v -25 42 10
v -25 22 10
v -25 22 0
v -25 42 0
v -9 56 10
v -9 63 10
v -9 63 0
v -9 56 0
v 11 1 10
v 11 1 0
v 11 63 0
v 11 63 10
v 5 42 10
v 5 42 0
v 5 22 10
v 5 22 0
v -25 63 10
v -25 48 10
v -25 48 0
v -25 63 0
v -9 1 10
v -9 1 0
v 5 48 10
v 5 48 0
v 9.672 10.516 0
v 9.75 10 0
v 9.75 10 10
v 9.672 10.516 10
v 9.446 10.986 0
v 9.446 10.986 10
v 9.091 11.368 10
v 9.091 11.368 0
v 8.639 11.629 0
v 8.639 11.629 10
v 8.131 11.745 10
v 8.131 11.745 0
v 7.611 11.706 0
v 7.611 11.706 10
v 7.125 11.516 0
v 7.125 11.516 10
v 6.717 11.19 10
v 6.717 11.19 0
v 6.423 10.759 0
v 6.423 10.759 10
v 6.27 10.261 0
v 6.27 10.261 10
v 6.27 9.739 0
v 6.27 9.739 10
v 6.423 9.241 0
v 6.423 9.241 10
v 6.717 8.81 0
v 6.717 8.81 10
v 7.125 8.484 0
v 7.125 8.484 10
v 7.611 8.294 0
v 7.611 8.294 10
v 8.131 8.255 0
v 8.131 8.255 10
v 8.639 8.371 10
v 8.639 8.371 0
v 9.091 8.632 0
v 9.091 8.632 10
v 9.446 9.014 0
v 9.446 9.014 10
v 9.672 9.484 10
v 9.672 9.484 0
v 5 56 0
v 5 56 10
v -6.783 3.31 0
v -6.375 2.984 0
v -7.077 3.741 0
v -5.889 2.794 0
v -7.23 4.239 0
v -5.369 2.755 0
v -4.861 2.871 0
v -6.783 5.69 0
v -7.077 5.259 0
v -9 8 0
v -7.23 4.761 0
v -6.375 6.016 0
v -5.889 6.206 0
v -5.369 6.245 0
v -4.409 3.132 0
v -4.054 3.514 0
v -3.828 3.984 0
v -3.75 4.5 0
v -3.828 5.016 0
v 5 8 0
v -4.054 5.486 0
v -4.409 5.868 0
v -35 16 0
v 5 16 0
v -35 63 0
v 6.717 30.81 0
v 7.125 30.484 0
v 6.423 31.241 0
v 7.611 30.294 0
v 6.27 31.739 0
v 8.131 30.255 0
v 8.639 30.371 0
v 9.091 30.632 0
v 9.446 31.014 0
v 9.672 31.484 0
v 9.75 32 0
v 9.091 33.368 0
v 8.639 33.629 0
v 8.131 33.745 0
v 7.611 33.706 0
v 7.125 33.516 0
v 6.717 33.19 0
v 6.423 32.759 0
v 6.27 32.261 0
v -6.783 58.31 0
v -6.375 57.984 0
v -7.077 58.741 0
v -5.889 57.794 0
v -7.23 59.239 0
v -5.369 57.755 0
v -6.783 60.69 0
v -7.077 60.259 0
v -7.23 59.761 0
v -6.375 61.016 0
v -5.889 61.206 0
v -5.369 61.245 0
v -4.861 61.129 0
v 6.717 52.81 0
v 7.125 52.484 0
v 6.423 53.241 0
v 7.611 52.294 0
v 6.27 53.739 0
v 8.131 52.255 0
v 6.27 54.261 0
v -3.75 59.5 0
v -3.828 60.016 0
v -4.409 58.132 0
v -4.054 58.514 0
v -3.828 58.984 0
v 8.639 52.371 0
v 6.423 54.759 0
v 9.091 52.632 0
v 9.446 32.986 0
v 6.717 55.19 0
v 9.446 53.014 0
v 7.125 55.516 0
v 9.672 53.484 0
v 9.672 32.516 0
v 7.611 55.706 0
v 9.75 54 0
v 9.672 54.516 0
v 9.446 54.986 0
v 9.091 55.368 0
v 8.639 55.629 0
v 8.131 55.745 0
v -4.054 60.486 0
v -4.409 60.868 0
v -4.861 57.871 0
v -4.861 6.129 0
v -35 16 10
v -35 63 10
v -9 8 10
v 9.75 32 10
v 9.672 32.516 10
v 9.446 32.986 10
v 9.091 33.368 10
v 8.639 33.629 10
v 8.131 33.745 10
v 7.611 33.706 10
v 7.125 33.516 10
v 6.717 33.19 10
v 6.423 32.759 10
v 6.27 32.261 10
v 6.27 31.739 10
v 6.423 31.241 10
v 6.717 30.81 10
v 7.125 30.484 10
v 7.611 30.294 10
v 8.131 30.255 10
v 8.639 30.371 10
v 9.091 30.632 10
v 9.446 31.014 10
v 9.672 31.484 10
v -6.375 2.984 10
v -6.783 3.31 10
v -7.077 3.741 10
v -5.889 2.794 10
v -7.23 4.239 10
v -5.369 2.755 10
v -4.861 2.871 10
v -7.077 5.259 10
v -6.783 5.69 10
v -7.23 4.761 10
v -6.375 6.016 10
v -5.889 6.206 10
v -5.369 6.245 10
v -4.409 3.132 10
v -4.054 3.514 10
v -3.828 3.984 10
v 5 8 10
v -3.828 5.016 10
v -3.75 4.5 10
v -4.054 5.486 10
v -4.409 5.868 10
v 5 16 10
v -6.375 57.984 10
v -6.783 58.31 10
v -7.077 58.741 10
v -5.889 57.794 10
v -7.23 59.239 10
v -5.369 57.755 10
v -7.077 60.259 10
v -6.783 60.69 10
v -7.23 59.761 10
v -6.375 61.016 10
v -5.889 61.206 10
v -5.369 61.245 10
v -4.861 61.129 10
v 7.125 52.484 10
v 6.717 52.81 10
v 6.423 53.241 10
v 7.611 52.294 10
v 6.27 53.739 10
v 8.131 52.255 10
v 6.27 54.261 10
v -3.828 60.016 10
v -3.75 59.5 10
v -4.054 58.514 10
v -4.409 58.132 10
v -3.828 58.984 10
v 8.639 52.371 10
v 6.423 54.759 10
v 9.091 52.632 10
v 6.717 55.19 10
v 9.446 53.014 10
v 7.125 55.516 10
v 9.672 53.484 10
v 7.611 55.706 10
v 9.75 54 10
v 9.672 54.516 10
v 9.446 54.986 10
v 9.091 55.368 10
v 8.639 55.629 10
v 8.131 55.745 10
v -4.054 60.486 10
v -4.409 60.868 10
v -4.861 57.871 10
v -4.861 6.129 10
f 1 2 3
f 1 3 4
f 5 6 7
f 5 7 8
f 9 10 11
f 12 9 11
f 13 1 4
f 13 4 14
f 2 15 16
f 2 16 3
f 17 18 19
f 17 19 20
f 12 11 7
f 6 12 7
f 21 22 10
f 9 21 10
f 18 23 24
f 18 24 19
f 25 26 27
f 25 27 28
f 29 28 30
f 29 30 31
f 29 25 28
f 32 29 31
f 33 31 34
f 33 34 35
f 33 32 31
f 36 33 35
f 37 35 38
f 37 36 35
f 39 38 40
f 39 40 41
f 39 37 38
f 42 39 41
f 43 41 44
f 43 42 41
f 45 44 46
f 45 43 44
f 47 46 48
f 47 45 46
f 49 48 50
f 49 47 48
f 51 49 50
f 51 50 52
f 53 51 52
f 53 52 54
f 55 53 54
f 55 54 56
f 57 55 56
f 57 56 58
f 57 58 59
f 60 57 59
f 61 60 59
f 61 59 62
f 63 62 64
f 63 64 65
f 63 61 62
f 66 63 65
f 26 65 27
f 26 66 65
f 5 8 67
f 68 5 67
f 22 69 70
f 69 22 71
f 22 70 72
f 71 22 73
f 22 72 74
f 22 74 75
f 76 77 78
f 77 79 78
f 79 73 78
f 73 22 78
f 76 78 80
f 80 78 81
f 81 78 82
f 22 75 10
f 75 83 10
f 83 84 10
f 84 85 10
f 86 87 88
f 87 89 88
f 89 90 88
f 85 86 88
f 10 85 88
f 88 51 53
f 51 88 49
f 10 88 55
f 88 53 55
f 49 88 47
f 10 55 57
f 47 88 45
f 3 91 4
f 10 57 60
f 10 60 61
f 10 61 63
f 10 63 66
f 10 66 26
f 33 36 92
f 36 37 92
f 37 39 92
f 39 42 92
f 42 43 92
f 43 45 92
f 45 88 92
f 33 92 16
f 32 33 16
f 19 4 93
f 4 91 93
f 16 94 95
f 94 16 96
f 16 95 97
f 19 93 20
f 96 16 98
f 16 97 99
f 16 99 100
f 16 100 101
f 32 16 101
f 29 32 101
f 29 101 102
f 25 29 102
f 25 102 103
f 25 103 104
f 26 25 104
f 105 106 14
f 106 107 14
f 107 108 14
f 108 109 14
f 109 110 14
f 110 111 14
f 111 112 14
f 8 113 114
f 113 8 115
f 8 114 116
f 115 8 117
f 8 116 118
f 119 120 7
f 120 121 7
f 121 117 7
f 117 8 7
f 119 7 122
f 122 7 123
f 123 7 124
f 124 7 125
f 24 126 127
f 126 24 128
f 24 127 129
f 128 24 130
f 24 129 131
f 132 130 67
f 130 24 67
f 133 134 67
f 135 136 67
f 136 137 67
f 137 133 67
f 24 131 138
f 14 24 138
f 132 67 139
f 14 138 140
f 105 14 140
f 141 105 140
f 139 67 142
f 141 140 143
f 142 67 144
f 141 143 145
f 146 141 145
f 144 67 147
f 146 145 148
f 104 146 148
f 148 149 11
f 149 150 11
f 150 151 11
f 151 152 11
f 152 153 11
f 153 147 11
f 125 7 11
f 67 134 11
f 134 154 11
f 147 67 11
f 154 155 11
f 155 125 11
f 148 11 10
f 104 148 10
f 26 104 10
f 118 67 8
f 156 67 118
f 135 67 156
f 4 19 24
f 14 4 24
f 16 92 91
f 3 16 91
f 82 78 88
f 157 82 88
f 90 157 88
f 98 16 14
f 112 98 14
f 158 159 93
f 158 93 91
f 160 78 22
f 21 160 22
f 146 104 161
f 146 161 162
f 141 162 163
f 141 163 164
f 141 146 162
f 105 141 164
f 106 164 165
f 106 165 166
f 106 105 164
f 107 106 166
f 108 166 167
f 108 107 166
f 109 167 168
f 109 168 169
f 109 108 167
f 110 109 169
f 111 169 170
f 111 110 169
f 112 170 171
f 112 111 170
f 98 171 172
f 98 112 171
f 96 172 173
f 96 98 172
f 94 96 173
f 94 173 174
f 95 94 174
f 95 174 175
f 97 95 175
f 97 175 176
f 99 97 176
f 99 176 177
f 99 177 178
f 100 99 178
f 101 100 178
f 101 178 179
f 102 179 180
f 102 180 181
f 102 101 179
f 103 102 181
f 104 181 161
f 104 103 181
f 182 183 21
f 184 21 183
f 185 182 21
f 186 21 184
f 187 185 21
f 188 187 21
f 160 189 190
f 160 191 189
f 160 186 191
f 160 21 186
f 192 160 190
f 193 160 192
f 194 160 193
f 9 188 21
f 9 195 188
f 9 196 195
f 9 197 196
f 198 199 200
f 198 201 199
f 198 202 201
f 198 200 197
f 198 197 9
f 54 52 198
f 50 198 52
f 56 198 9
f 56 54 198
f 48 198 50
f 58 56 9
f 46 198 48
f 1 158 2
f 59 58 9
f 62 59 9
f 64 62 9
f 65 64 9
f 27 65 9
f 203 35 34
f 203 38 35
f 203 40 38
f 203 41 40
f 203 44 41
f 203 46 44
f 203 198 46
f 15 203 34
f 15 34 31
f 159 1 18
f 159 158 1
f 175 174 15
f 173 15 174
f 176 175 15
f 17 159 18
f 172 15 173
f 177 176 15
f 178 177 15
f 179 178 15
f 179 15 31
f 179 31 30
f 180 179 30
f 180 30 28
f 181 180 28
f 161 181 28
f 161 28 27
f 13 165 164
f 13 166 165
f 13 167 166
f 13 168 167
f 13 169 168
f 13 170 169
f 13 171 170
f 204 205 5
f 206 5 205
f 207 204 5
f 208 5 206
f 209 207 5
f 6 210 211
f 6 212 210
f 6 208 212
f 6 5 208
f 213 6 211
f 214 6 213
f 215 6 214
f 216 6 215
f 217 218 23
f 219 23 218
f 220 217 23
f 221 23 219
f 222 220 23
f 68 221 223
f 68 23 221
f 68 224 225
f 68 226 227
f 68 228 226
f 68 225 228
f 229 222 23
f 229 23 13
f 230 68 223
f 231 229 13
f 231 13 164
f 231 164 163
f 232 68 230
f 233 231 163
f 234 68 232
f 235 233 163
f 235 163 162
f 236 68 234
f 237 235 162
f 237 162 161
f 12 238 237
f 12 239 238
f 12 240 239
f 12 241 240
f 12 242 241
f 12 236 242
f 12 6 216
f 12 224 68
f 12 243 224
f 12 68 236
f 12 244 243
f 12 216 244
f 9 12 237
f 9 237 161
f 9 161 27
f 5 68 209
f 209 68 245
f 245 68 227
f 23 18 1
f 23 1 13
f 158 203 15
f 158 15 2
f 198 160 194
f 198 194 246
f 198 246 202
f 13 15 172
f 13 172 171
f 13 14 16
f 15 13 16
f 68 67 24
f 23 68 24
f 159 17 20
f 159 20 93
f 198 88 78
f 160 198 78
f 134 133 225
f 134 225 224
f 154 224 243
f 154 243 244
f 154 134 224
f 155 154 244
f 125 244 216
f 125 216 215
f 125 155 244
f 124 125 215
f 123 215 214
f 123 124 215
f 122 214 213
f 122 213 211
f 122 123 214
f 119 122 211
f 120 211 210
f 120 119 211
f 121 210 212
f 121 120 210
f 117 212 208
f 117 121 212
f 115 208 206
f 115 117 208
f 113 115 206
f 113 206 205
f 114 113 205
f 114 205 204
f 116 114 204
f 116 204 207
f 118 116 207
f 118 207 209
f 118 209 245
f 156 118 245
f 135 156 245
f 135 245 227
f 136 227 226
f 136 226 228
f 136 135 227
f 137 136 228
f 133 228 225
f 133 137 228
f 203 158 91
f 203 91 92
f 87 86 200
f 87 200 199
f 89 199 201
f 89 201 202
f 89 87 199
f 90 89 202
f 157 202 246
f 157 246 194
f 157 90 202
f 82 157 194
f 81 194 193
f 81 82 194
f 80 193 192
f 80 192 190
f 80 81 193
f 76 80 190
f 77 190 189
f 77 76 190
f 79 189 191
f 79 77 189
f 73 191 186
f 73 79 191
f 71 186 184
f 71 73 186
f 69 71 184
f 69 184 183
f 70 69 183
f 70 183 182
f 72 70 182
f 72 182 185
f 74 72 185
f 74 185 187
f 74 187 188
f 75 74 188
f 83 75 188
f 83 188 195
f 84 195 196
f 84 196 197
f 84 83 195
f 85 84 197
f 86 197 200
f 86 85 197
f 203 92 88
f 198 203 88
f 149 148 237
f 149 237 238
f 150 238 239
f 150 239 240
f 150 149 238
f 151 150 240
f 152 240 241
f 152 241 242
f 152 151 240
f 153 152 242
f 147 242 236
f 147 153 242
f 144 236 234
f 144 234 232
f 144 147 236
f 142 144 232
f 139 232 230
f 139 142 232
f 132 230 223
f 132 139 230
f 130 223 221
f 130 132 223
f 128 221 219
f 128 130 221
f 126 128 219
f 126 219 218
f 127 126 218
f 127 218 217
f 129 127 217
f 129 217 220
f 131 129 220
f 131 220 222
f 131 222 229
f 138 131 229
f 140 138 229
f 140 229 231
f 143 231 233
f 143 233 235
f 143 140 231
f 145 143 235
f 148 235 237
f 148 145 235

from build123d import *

# Parameters (mm, degrees)
SKETCH1_R           = 1.75
BOSS_EXTRUDE1_DEPTH = 10
BOSS_EXTRUDE2_DEPTH = 10


with BuildPart() as part:
    # Sketch1 → Boss-Extrude1 (new body)
    with BuildSketch(Plane.XY):
        Polygon((-2.419560872, 1), (11, 1), (11, 8), (11, 63), (-9, 63), (-9, 56), (5, 56), (5, 8), (-9, 8), (-9, 1), align=None)
        with Locations((-5.5, 59.5)):
            Circle(SKETCH1_R, mode=Mode.SUBTRACT)
        with Locations((8, 54)):
            Circle(SKETCH1_R, mode=Mode.SUBTRACT)
        with Locations((-5.5, 4.5)):
            Circle(SKETCH1_R, mode=Mode.SUBTRACT)
        with Locations((8, 10)):
            Circle(SKETCH1_R, mode=Mode.SUBTRACT)
        with Locations((8, 32)):
            Circle(SKETCH1_R, mode=Mode.SUBTRACT)
    extrude(amount=BOSS_EXTRUDE1_DEPTH)

    # Sketch2 → Boss-Extrude2 (add)
    with BuildSketch(Plane.XY.offset(10)):
        Polygon((5, 42), (5, 48), (-25, 48), (-25, 63), (-35, 63), (-35, 16), (5, 16), (5, 22), (-25, 22), (-25, 42), align=None)
    extrude(amount=-BOSS_EXTRUDE2_DEPTH)


solid = part.part
